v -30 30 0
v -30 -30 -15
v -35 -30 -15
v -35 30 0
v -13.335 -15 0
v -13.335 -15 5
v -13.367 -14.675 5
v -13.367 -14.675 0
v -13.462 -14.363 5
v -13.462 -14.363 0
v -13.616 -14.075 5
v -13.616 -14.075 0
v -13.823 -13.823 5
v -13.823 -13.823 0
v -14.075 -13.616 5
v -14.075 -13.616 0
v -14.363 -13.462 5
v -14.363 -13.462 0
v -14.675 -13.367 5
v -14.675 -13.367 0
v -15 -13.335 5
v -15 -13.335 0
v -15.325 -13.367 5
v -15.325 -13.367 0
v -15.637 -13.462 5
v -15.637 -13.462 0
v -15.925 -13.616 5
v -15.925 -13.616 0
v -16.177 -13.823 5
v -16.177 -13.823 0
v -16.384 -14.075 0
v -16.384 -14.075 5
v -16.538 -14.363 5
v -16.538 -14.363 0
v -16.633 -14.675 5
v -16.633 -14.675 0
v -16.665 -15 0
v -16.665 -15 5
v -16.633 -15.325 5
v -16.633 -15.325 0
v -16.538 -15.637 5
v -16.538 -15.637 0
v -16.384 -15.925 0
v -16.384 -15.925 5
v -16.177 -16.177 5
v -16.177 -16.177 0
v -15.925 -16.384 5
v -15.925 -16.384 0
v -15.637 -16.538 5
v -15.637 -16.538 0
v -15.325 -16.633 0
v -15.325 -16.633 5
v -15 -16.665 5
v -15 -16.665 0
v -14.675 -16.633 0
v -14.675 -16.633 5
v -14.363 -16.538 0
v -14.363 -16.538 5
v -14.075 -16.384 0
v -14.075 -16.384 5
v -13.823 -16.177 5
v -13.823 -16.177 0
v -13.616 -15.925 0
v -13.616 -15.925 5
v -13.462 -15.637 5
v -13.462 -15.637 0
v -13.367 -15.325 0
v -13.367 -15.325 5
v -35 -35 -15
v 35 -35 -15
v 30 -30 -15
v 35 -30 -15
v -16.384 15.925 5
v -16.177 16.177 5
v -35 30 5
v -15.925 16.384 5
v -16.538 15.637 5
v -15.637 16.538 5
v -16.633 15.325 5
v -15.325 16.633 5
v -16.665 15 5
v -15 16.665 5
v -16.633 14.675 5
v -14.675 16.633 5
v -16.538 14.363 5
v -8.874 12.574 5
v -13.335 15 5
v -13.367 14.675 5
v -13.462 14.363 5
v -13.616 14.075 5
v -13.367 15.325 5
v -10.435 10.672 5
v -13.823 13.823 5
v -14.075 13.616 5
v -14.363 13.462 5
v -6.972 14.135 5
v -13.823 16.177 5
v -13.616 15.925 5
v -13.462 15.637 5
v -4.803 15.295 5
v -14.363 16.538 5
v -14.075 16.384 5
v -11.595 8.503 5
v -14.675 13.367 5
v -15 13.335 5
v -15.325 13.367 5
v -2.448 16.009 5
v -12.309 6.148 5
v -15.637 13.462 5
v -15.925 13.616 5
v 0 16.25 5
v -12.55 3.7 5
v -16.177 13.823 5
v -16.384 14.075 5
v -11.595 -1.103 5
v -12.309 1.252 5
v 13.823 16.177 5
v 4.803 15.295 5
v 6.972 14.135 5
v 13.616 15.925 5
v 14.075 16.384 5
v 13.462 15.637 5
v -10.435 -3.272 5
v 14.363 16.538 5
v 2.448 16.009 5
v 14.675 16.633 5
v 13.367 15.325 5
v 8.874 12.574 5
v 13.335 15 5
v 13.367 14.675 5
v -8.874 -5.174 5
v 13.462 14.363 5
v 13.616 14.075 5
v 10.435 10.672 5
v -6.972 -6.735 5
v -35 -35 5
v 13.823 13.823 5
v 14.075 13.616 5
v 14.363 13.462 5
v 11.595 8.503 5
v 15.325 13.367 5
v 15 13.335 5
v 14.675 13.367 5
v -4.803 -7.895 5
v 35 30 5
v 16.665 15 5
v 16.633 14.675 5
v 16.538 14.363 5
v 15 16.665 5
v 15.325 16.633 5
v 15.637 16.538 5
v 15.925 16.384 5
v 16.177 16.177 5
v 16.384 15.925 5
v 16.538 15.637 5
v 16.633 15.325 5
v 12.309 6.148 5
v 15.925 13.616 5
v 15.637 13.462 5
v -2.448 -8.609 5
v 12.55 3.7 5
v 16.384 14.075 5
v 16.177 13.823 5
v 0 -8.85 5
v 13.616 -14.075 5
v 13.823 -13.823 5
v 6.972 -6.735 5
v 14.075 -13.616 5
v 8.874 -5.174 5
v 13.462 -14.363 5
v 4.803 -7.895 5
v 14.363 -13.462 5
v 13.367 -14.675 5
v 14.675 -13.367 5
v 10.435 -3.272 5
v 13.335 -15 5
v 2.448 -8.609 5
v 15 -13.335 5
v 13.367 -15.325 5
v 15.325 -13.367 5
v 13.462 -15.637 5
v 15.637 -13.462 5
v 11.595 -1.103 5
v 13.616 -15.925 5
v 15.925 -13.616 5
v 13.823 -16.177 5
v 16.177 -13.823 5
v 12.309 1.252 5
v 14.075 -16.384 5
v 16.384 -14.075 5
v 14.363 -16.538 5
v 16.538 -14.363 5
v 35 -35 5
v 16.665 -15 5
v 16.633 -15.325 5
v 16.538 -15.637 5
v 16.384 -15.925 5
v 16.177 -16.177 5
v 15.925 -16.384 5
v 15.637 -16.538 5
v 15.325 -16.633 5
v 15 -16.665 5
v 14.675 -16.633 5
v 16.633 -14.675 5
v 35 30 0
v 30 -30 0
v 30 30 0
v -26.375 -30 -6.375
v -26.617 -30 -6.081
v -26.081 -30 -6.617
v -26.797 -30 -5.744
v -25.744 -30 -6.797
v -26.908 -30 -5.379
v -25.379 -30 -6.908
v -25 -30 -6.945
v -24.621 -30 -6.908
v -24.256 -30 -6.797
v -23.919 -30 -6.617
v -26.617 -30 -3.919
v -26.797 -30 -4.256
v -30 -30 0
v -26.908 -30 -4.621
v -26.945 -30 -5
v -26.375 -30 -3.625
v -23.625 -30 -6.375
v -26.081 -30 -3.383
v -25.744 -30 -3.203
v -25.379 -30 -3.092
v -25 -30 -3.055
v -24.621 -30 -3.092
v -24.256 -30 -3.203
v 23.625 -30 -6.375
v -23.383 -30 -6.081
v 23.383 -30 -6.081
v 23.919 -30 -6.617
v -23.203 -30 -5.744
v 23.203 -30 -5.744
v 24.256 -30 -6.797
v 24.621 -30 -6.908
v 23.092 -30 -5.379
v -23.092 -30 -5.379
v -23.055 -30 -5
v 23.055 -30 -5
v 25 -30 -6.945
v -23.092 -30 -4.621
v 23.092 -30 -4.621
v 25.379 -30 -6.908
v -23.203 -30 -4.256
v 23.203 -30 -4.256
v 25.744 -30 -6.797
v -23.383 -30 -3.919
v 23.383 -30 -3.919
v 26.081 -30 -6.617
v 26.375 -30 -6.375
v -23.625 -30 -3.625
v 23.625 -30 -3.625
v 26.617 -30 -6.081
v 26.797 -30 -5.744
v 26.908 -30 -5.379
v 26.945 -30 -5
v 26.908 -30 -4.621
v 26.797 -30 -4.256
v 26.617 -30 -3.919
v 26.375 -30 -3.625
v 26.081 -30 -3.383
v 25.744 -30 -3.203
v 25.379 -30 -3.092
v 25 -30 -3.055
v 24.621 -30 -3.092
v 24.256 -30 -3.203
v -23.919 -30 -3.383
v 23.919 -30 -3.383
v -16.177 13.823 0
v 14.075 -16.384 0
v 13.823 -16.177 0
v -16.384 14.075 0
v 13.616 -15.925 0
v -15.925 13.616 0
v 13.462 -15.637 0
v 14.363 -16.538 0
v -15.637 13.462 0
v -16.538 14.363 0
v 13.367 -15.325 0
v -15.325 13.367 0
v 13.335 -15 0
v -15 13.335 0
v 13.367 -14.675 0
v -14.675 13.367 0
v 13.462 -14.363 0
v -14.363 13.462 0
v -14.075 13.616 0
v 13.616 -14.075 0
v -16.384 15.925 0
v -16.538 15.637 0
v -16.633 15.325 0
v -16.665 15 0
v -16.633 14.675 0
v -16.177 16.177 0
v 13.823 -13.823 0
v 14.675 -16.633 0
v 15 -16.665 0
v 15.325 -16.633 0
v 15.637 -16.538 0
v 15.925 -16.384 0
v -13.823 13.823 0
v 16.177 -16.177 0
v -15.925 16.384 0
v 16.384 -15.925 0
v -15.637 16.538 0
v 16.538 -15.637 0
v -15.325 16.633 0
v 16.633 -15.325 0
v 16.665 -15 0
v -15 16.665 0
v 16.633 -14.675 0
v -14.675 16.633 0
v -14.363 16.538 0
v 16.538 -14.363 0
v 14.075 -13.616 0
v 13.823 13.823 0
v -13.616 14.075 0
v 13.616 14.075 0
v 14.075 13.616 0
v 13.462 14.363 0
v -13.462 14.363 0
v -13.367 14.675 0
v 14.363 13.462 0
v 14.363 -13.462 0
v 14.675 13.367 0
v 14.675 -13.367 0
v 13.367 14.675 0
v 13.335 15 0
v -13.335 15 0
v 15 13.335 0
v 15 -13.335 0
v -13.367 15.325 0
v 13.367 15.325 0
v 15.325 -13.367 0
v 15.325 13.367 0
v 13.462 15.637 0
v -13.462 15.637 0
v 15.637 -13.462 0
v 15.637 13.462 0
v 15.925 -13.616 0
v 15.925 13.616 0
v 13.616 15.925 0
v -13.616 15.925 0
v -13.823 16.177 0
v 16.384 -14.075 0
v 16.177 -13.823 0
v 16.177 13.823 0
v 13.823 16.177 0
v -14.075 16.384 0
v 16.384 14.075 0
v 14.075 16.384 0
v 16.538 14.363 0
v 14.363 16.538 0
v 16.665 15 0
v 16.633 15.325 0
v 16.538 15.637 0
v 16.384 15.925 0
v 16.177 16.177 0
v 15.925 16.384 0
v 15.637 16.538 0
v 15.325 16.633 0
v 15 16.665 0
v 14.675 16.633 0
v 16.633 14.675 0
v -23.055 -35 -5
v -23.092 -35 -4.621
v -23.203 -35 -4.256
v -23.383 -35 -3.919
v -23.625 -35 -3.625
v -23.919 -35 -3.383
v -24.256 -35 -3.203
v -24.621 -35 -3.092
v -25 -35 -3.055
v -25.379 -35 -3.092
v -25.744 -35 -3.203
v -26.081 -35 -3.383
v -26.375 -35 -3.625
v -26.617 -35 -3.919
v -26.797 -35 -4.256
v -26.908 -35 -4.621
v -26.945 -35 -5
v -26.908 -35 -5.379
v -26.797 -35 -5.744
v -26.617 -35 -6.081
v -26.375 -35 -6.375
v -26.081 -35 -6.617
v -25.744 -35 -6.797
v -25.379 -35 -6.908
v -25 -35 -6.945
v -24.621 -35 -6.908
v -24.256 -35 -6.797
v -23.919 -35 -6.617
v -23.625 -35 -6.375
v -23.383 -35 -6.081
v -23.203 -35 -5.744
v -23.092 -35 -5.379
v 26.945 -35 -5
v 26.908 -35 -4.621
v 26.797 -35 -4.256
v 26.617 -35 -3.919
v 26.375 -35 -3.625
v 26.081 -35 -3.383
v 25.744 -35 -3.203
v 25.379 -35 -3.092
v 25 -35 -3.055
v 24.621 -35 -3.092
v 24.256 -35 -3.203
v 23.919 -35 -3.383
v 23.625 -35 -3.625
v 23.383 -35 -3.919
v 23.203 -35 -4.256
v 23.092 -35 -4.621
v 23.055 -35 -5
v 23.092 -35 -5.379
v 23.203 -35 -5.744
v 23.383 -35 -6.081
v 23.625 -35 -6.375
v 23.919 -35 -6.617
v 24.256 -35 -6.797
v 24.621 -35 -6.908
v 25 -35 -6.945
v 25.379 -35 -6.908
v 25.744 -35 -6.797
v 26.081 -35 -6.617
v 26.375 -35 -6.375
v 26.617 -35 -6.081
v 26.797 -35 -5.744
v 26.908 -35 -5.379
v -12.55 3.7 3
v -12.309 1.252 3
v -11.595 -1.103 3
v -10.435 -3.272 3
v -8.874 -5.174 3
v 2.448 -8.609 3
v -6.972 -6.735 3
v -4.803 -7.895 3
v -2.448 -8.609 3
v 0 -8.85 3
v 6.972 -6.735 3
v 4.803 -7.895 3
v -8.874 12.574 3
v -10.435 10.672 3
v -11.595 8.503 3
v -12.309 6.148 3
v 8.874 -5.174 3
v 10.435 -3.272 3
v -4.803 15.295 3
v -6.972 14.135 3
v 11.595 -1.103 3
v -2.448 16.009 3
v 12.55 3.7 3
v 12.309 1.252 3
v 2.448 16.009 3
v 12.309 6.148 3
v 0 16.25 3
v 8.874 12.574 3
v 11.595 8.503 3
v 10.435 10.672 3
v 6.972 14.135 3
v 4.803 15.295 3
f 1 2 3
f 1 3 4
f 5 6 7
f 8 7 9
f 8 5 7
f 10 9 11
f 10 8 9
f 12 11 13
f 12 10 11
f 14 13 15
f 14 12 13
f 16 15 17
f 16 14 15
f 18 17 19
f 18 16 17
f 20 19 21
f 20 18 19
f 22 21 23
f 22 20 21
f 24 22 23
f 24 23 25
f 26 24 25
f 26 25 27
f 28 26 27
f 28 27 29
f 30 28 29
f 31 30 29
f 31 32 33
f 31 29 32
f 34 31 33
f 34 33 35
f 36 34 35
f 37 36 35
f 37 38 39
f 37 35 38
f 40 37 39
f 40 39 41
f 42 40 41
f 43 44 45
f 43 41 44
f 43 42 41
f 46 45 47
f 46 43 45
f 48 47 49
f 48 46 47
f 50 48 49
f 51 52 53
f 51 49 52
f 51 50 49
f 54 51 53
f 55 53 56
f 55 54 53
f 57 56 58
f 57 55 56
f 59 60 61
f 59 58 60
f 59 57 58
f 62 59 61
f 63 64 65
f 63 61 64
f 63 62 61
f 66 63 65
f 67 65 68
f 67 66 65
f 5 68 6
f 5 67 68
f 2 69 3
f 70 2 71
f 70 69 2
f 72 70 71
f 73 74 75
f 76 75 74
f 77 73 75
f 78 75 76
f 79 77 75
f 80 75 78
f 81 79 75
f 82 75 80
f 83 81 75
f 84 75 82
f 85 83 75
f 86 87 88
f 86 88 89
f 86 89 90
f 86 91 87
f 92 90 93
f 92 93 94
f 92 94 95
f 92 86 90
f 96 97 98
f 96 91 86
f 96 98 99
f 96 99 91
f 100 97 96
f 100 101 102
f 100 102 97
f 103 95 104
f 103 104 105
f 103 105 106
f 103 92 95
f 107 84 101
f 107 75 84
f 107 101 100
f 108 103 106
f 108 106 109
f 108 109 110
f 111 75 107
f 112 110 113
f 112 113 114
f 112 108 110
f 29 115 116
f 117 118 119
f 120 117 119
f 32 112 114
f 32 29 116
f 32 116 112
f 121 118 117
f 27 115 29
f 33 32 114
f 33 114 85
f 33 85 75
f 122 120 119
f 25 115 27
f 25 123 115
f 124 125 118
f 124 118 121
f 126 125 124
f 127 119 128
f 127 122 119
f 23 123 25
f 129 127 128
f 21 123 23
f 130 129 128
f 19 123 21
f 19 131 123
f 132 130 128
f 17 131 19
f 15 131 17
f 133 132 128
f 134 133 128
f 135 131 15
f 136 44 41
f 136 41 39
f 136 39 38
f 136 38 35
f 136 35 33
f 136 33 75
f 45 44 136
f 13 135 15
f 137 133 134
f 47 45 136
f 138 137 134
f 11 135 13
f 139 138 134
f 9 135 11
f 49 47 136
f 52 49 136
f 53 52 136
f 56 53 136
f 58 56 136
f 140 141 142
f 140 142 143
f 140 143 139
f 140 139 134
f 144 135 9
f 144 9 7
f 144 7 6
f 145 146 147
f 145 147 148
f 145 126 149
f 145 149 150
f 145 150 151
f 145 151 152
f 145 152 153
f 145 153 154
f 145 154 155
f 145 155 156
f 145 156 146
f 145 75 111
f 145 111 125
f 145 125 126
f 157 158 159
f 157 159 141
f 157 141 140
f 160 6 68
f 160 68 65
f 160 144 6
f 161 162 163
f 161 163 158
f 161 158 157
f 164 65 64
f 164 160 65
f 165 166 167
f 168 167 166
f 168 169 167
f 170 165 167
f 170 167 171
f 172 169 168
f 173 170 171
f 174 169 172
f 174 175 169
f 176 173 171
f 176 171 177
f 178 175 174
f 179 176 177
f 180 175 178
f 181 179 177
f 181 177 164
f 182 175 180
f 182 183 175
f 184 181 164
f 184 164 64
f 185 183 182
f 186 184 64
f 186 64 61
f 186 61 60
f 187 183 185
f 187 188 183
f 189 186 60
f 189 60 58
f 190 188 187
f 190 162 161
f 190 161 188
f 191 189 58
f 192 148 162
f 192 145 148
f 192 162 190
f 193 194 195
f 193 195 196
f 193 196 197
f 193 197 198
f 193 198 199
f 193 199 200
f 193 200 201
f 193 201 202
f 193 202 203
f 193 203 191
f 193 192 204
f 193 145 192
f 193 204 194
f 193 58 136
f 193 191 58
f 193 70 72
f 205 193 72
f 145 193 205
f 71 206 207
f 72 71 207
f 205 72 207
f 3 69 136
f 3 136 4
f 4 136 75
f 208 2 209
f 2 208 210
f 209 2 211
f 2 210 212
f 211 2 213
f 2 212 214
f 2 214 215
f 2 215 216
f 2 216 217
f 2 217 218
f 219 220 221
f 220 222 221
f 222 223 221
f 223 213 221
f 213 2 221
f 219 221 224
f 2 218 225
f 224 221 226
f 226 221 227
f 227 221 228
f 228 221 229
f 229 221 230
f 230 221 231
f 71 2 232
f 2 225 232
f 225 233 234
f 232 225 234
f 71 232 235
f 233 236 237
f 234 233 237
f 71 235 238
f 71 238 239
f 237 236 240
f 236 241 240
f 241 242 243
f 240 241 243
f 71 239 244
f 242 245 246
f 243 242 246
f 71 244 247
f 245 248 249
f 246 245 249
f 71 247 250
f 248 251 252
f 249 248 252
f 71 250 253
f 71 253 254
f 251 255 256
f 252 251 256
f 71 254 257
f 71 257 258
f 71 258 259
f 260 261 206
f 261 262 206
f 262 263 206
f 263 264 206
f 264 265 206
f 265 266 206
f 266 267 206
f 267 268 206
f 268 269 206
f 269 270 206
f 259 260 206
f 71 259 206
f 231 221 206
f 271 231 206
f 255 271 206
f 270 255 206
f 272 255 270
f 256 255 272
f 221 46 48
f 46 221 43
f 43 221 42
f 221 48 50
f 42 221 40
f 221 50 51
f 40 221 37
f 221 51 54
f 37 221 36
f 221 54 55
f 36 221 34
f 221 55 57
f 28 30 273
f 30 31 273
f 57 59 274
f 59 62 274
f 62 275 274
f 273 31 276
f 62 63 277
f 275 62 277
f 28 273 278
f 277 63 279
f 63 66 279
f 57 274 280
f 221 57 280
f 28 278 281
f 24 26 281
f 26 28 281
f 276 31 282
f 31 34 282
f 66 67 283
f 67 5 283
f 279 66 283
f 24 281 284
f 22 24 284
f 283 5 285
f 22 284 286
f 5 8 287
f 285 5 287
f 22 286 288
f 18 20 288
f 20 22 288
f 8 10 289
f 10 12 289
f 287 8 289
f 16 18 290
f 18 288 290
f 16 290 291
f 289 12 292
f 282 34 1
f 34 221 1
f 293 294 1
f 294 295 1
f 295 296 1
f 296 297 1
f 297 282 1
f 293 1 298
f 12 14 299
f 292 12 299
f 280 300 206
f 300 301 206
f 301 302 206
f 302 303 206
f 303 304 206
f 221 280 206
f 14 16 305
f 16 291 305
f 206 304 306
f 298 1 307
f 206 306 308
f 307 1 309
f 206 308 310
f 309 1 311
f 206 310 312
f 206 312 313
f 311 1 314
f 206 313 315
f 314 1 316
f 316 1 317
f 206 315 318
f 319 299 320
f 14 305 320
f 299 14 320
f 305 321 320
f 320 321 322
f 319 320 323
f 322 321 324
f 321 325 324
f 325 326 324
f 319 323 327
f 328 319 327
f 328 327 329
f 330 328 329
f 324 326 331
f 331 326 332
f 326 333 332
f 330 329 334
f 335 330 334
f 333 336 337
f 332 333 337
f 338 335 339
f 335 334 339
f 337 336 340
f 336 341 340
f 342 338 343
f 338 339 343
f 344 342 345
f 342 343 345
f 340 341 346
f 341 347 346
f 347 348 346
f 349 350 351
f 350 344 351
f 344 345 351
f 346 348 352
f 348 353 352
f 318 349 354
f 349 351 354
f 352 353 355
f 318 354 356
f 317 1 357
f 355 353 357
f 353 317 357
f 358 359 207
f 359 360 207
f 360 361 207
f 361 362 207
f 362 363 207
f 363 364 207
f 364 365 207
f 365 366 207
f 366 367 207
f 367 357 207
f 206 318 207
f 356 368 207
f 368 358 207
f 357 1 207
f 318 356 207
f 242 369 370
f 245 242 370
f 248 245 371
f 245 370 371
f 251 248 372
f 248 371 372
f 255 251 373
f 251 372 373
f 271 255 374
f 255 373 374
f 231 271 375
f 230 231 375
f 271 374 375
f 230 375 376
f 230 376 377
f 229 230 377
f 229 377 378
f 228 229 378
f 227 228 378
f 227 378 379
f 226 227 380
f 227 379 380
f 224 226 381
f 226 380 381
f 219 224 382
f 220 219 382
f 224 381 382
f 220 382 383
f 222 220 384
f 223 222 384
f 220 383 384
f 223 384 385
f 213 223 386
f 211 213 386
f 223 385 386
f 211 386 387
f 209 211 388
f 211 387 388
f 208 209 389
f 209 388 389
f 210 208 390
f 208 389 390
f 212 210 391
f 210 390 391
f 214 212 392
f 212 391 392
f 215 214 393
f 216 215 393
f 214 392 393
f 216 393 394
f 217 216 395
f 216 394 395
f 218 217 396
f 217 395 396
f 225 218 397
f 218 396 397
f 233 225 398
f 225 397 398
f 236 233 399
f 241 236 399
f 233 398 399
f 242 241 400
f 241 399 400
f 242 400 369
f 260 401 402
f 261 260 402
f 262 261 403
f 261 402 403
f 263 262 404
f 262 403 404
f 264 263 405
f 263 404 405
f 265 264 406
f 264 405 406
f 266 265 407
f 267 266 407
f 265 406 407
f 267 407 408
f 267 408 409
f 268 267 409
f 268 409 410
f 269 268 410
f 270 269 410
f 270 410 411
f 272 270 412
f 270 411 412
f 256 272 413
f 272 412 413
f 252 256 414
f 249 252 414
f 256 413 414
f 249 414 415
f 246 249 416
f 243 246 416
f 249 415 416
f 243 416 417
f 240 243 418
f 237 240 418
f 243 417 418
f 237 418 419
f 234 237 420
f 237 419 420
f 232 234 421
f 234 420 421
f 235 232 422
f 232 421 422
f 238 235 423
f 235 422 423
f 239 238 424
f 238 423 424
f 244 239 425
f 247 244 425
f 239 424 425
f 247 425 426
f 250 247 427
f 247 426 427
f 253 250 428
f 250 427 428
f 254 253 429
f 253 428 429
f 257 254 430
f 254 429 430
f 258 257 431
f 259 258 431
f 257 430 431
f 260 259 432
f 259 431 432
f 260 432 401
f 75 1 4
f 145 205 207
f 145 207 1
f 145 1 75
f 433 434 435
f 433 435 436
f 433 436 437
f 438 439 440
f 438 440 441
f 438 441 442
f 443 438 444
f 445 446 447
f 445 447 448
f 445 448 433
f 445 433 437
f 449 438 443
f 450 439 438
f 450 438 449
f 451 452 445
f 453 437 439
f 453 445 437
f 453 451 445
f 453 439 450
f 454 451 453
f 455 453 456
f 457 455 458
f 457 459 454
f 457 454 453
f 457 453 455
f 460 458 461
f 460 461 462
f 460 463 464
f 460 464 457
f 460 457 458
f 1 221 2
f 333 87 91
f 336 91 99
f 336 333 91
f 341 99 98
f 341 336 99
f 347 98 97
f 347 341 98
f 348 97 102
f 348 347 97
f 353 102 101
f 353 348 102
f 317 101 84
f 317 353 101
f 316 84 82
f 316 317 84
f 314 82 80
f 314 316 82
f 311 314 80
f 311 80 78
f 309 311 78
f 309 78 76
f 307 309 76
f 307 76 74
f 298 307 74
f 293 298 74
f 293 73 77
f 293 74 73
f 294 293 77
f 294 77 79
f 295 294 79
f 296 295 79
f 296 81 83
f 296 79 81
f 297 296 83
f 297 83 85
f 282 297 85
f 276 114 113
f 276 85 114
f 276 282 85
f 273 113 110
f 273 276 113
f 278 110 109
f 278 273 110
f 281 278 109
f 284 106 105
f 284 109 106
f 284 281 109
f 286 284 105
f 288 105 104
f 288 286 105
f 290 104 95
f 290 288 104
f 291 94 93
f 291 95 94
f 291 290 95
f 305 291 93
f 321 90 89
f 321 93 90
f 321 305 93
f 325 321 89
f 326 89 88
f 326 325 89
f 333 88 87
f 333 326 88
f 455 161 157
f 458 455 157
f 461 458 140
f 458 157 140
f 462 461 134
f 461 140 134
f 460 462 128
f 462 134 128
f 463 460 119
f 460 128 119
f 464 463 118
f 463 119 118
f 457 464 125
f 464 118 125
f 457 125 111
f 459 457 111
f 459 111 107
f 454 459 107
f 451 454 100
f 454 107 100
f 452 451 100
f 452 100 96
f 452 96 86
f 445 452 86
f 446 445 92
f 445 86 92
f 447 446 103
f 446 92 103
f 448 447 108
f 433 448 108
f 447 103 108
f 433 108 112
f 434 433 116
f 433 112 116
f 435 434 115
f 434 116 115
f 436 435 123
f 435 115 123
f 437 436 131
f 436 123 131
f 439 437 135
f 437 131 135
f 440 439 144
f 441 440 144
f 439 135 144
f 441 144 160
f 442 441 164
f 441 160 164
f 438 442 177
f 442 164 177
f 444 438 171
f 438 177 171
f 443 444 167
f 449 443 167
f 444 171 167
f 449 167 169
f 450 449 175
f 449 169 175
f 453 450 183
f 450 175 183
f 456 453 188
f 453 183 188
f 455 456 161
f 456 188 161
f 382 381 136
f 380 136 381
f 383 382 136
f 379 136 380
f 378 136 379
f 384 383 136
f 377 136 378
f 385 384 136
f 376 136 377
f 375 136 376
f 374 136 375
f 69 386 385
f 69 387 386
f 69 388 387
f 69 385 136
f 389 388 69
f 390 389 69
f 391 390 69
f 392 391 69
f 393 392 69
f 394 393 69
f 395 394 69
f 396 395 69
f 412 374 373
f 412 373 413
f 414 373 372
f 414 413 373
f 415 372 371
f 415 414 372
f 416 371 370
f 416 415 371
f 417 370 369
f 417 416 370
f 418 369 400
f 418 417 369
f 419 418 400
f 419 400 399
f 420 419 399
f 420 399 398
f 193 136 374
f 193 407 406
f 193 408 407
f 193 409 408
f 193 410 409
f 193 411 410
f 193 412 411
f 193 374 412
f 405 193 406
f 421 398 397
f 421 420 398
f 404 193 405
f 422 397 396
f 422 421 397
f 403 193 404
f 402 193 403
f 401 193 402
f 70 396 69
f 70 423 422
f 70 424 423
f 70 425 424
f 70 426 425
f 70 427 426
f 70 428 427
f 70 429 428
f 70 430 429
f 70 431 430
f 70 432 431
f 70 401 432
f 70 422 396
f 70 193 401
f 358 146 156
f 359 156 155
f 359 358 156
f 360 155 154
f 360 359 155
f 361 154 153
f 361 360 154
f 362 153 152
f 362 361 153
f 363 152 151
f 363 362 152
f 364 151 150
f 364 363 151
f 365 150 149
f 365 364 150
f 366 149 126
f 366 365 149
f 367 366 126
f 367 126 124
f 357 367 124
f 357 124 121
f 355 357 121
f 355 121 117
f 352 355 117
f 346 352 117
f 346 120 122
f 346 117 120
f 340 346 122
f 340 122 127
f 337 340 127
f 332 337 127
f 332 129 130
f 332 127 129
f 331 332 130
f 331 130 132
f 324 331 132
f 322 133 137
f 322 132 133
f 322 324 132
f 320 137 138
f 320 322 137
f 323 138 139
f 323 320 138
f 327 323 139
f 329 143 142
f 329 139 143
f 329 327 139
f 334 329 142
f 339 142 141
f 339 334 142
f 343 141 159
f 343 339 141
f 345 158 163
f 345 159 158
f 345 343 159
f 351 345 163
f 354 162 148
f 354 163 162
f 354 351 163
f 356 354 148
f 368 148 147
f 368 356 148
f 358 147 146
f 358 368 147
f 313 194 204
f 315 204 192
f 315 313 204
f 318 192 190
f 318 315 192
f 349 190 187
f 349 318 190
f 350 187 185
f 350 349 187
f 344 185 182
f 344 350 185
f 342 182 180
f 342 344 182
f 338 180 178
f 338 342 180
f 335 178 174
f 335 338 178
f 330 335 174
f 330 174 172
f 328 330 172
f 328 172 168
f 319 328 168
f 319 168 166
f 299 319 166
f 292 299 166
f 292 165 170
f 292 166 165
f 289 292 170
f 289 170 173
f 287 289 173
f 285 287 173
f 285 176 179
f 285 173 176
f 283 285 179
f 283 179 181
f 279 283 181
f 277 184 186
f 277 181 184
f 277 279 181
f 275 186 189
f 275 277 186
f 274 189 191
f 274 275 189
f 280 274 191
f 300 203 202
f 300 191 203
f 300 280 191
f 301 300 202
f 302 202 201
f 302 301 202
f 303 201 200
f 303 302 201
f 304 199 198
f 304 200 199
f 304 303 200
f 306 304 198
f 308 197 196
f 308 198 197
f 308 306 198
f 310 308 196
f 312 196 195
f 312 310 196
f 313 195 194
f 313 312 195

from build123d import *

# Parameters (mm, degrees)
F0_W      = 60
F0_H      = 60
F0_R      = 1.665
F1_DEPTH  = 5
F2_W      = 60
F2_H      = 20
F3_DEPTH  = 5
F5_DEPTH  = 5
F7_R      = 1.945
F8_DEPTH  = 5
F9_R      = 12.55
F10_DEPTH = 2


with BuildPart() as f1:
    # F0 (on Top) → F1 (new body)
    with BuildSketch(Plane.XY):
        Rectangle(F0_W, F0_H)
        with Locations((-15, -15)):
            Circle(F0_R, mode=Mode.SUBTRACT)
        with Locations((15, -15)):
            Circle(F0_R, mode=Mode.SUBTRACT)
        with Locations((-15, 15)):
            Circle(F0_R, mode=Mode.SUBTRACT)
        with Locations((15, 15)):
            Circle(F0_R, mode=Mode.SUBTRACT)
    extrude(amount=F1_DEPTH)

    # F2 (on face) → F3 (join)
    with BuildSketch(Plane.XZ.offset(30)):
        with Locations((0, -5)):
            Rectangle(F2_W, F2_H)
    extrude(amount=F3_DEPTH)

    # F4 (on face) → F5 (join)
    with BuildSketch(Plane.YZ.offset(30)):
        Polygon((-30, -15), (30, 0), (30, 5), (-35, 5), (-35, -15), align=None)
    extrude(amount=F5_DEPTH)

    # F6: F1 across plane


with BuildPart() as f1_1:
    add(f1.part)
    add(f1.part.mirror(Plane.YZ))

    # F7 (on face) → F8 (cut, through all)
    with BuildSketch(Plane.XZ.offset(35)):
        with Locations((-25, -5)):
            Circle(F7_R)
        with Locations((25, -5)):
            Circle(F7_R)
    extrude(amount=-F8_DEPTH, mode=Mode.SUBTRACT)

    # F9 (on face) → F10 (cut)
    with BuildSketch(Plane.XY.offset(5)):
        with Locations((0, 3.7)):
            Circle(F9_R)
    extrude(amount=-F10_DEPTH, mode=Mode.SUBTRACT)


solid = f1_1.part
